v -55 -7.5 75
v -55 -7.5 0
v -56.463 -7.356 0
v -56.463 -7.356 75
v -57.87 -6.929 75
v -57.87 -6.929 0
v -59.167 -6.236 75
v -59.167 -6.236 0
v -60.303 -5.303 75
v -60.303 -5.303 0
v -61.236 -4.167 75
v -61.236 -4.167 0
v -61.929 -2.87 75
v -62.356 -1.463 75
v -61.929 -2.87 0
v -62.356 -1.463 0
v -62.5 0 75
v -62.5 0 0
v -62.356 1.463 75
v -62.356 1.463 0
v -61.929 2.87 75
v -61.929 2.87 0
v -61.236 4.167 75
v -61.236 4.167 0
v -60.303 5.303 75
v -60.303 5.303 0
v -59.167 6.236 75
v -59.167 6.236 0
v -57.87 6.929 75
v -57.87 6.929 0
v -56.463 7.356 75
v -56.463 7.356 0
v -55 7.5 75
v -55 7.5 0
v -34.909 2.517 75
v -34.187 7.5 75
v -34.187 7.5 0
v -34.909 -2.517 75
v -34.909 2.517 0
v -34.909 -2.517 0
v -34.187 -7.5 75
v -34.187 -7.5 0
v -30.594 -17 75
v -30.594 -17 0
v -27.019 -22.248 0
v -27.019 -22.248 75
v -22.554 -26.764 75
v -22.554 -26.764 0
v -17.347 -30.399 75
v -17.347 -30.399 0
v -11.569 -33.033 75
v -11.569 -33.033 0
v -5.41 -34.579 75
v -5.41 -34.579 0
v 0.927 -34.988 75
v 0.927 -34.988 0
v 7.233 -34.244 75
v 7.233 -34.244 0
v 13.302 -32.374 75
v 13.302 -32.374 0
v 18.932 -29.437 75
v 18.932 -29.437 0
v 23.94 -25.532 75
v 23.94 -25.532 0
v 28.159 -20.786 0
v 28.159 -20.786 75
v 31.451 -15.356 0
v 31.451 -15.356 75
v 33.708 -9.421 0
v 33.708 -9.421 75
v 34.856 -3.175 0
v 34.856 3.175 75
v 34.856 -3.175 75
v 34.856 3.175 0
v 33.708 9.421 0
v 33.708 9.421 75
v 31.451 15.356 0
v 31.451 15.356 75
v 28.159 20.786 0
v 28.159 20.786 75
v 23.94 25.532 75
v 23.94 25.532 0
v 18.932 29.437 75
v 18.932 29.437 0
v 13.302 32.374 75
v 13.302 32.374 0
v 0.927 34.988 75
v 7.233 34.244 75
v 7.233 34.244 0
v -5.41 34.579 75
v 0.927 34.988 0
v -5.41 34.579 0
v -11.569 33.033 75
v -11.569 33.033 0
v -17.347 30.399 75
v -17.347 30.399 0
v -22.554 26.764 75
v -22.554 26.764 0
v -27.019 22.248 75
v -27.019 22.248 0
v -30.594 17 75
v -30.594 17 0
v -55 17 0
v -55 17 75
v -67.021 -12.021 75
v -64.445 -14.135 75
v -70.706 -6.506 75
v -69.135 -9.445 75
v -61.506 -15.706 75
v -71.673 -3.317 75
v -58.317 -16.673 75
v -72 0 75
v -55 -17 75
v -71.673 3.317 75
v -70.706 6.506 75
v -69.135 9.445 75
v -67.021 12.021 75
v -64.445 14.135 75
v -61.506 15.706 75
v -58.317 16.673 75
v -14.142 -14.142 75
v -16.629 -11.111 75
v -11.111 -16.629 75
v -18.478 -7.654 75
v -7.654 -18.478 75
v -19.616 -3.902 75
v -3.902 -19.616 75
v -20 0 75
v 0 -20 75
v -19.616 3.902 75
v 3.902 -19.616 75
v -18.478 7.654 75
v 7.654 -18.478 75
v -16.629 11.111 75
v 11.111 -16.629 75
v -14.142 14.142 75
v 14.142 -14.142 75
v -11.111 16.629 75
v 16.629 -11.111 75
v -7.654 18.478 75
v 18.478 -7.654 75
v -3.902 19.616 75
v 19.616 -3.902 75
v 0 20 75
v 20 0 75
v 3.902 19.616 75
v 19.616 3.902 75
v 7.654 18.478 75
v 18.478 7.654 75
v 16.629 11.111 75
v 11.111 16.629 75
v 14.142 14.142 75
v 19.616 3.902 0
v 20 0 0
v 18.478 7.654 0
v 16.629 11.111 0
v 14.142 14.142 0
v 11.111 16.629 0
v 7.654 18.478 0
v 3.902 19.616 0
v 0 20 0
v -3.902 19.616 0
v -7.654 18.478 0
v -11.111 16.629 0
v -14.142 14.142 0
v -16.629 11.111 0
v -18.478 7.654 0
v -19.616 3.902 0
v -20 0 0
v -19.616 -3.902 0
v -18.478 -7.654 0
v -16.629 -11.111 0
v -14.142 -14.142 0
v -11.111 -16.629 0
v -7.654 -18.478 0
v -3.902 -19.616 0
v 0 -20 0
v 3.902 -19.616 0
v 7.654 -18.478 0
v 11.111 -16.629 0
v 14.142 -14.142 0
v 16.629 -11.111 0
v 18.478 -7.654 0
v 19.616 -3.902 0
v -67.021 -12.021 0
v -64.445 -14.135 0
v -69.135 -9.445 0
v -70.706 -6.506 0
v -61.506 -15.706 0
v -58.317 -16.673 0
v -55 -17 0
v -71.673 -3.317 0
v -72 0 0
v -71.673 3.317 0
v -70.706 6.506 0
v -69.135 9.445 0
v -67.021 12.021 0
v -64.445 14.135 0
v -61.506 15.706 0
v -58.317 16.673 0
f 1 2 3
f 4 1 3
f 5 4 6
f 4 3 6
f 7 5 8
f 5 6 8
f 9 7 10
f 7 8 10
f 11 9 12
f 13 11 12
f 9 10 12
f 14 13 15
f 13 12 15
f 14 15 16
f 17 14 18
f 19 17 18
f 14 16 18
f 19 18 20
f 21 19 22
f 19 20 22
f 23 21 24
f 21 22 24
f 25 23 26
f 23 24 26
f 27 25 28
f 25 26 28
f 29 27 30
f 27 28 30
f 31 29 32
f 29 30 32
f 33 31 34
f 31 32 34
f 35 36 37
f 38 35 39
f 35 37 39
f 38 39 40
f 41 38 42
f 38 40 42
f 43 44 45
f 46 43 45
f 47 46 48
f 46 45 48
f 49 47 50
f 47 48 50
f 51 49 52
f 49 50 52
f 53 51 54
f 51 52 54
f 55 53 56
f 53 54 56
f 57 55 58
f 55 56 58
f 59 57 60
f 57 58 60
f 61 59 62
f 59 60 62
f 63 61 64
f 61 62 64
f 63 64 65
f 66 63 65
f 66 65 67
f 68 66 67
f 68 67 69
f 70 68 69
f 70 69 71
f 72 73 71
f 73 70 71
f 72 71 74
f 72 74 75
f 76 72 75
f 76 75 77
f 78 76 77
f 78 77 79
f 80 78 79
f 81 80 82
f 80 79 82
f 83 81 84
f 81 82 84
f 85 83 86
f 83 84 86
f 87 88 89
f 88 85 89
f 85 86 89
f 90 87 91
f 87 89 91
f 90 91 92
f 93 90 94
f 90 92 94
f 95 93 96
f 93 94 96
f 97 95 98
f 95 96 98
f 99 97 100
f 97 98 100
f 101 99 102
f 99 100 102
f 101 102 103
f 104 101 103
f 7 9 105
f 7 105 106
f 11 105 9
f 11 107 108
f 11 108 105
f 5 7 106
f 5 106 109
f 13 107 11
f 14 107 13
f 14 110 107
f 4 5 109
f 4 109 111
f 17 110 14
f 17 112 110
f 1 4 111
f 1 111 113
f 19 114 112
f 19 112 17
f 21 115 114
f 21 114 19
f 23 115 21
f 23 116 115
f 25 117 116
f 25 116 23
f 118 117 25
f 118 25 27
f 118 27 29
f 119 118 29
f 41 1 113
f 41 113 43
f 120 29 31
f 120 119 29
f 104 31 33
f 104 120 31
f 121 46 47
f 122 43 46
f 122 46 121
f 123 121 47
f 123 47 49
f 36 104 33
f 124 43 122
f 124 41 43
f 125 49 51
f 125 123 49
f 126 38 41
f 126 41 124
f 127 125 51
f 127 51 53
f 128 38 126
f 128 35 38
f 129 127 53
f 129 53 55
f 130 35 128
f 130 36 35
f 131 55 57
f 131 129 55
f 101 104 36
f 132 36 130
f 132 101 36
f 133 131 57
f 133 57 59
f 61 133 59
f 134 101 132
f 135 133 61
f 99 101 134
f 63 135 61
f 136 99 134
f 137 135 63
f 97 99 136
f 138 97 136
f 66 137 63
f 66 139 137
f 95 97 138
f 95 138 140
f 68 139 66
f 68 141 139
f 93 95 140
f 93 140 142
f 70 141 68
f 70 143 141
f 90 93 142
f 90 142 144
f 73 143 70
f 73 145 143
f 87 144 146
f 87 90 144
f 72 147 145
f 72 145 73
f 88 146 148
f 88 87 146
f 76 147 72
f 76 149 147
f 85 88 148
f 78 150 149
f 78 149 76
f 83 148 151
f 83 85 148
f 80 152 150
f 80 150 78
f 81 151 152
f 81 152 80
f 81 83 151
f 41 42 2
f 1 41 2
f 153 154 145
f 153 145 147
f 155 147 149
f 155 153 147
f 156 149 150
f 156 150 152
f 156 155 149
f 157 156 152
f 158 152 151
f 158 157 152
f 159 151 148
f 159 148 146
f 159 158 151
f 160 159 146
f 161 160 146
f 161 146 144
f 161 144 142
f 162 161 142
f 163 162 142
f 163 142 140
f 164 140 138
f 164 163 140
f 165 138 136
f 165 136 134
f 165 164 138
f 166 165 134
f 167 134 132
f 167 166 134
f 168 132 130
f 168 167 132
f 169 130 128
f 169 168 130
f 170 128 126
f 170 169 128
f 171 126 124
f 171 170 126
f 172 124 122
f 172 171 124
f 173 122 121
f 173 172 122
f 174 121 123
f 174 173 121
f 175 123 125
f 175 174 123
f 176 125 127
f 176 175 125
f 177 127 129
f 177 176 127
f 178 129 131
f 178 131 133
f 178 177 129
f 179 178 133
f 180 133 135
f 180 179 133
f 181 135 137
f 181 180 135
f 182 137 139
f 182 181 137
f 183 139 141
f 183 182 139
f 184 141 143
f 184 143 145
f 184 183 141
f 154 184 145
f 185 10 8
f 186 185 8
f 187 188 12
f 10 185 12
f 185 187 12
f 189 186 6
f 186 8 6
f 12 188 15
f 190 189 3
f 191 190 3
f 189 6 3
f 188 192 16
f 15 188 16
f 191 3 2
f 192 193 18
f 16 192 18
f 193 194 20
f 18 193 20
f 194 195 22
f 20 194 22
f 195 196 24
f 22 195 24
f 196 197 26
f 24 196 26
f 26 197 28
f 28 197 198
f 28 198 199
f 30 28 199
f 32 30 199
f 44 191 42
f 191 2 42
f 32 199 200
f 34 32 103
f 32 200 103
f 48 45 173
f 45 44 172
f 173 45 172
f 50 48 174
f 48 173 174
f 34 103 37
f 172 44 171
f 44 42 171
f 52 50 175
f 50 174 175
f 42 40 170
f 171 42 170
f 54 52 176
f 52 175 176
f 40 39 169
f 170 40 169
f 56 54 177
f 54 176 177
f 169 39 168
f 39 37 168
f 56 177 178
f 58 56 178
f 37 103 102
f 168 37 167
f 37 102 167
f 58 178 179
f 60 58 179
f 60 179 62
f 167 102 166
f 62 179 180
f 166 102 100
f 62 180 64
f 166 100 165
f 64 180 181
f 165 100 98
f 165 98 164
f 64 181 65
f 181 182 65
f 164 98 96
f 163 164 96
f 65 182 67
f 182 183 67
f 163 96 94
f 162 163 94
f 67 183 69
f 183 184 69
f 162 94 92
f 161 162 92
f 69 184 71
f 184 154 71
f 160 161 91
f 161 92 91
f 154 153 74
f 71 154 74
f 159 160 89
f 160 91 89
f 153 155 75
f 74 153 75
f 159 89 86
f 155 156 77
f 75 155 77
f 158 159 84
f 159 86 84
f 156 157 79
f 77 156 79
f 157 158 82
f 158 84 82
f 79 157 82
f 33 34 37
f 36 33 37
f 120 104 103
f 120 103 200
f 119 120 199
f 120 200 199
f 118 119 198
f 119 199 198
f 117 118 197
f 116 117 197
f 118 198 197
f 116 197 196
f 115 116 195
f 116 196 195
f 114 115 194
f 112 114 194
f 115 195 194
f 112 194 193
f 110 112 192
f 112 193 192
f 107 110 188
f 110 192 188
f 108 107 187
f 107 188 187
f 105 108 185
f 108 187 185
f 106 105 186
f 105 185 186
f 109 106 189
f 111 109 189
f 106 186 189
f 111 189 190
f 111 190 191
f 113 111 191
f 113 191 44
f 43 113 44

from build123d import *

# Parameters (mm, degrees)
SKETCH1_R           = 35
SKETCH1_R_2         = 20
BOSS_EXTRUDE1_DEPTH = 75


with BuildPart() as part:
    # Sketch1 → Boss-Extrude1 (new body)
    # profile 1 of 2: a face of its own
    with BuildSketch(Plane.XY):
        Circle(SKETCH1_R)
        Circle(SKETCH1_R_2, mode=Mode.SUBTRACT)
    # profile 2 of 2: a face of its own
    with BuildSketch(Plane.XY):
        with BuildLine():
            ThreePointArc((-34.186985828, 7.5), (-32.736987087, 12.381020816), (-30.594117082, 17))
            Line((-30.594117082, 17), (-55, 17))
            ThreePointArc((-55, 17), (-72, 0), (-55, -17))
            Line((-55, -17), (-30.594117082, -17))
            ThreePointArc((-30.594117082, -17), (-32.736987087, -12.381020816), (-34.186985828, -7.5))
            Line((-34.186985828, -7.5), (-55, -7.5))
            ThreePointArc((-55, -7.5), (-62.5, 0), (-55, 7.5))
            Line((-55, 7.5), (-34.186985828, 7.5))
        make_face()
    extrude(amount=BOSS_EXTRUDE1_DEPTH)


solid = part.part
